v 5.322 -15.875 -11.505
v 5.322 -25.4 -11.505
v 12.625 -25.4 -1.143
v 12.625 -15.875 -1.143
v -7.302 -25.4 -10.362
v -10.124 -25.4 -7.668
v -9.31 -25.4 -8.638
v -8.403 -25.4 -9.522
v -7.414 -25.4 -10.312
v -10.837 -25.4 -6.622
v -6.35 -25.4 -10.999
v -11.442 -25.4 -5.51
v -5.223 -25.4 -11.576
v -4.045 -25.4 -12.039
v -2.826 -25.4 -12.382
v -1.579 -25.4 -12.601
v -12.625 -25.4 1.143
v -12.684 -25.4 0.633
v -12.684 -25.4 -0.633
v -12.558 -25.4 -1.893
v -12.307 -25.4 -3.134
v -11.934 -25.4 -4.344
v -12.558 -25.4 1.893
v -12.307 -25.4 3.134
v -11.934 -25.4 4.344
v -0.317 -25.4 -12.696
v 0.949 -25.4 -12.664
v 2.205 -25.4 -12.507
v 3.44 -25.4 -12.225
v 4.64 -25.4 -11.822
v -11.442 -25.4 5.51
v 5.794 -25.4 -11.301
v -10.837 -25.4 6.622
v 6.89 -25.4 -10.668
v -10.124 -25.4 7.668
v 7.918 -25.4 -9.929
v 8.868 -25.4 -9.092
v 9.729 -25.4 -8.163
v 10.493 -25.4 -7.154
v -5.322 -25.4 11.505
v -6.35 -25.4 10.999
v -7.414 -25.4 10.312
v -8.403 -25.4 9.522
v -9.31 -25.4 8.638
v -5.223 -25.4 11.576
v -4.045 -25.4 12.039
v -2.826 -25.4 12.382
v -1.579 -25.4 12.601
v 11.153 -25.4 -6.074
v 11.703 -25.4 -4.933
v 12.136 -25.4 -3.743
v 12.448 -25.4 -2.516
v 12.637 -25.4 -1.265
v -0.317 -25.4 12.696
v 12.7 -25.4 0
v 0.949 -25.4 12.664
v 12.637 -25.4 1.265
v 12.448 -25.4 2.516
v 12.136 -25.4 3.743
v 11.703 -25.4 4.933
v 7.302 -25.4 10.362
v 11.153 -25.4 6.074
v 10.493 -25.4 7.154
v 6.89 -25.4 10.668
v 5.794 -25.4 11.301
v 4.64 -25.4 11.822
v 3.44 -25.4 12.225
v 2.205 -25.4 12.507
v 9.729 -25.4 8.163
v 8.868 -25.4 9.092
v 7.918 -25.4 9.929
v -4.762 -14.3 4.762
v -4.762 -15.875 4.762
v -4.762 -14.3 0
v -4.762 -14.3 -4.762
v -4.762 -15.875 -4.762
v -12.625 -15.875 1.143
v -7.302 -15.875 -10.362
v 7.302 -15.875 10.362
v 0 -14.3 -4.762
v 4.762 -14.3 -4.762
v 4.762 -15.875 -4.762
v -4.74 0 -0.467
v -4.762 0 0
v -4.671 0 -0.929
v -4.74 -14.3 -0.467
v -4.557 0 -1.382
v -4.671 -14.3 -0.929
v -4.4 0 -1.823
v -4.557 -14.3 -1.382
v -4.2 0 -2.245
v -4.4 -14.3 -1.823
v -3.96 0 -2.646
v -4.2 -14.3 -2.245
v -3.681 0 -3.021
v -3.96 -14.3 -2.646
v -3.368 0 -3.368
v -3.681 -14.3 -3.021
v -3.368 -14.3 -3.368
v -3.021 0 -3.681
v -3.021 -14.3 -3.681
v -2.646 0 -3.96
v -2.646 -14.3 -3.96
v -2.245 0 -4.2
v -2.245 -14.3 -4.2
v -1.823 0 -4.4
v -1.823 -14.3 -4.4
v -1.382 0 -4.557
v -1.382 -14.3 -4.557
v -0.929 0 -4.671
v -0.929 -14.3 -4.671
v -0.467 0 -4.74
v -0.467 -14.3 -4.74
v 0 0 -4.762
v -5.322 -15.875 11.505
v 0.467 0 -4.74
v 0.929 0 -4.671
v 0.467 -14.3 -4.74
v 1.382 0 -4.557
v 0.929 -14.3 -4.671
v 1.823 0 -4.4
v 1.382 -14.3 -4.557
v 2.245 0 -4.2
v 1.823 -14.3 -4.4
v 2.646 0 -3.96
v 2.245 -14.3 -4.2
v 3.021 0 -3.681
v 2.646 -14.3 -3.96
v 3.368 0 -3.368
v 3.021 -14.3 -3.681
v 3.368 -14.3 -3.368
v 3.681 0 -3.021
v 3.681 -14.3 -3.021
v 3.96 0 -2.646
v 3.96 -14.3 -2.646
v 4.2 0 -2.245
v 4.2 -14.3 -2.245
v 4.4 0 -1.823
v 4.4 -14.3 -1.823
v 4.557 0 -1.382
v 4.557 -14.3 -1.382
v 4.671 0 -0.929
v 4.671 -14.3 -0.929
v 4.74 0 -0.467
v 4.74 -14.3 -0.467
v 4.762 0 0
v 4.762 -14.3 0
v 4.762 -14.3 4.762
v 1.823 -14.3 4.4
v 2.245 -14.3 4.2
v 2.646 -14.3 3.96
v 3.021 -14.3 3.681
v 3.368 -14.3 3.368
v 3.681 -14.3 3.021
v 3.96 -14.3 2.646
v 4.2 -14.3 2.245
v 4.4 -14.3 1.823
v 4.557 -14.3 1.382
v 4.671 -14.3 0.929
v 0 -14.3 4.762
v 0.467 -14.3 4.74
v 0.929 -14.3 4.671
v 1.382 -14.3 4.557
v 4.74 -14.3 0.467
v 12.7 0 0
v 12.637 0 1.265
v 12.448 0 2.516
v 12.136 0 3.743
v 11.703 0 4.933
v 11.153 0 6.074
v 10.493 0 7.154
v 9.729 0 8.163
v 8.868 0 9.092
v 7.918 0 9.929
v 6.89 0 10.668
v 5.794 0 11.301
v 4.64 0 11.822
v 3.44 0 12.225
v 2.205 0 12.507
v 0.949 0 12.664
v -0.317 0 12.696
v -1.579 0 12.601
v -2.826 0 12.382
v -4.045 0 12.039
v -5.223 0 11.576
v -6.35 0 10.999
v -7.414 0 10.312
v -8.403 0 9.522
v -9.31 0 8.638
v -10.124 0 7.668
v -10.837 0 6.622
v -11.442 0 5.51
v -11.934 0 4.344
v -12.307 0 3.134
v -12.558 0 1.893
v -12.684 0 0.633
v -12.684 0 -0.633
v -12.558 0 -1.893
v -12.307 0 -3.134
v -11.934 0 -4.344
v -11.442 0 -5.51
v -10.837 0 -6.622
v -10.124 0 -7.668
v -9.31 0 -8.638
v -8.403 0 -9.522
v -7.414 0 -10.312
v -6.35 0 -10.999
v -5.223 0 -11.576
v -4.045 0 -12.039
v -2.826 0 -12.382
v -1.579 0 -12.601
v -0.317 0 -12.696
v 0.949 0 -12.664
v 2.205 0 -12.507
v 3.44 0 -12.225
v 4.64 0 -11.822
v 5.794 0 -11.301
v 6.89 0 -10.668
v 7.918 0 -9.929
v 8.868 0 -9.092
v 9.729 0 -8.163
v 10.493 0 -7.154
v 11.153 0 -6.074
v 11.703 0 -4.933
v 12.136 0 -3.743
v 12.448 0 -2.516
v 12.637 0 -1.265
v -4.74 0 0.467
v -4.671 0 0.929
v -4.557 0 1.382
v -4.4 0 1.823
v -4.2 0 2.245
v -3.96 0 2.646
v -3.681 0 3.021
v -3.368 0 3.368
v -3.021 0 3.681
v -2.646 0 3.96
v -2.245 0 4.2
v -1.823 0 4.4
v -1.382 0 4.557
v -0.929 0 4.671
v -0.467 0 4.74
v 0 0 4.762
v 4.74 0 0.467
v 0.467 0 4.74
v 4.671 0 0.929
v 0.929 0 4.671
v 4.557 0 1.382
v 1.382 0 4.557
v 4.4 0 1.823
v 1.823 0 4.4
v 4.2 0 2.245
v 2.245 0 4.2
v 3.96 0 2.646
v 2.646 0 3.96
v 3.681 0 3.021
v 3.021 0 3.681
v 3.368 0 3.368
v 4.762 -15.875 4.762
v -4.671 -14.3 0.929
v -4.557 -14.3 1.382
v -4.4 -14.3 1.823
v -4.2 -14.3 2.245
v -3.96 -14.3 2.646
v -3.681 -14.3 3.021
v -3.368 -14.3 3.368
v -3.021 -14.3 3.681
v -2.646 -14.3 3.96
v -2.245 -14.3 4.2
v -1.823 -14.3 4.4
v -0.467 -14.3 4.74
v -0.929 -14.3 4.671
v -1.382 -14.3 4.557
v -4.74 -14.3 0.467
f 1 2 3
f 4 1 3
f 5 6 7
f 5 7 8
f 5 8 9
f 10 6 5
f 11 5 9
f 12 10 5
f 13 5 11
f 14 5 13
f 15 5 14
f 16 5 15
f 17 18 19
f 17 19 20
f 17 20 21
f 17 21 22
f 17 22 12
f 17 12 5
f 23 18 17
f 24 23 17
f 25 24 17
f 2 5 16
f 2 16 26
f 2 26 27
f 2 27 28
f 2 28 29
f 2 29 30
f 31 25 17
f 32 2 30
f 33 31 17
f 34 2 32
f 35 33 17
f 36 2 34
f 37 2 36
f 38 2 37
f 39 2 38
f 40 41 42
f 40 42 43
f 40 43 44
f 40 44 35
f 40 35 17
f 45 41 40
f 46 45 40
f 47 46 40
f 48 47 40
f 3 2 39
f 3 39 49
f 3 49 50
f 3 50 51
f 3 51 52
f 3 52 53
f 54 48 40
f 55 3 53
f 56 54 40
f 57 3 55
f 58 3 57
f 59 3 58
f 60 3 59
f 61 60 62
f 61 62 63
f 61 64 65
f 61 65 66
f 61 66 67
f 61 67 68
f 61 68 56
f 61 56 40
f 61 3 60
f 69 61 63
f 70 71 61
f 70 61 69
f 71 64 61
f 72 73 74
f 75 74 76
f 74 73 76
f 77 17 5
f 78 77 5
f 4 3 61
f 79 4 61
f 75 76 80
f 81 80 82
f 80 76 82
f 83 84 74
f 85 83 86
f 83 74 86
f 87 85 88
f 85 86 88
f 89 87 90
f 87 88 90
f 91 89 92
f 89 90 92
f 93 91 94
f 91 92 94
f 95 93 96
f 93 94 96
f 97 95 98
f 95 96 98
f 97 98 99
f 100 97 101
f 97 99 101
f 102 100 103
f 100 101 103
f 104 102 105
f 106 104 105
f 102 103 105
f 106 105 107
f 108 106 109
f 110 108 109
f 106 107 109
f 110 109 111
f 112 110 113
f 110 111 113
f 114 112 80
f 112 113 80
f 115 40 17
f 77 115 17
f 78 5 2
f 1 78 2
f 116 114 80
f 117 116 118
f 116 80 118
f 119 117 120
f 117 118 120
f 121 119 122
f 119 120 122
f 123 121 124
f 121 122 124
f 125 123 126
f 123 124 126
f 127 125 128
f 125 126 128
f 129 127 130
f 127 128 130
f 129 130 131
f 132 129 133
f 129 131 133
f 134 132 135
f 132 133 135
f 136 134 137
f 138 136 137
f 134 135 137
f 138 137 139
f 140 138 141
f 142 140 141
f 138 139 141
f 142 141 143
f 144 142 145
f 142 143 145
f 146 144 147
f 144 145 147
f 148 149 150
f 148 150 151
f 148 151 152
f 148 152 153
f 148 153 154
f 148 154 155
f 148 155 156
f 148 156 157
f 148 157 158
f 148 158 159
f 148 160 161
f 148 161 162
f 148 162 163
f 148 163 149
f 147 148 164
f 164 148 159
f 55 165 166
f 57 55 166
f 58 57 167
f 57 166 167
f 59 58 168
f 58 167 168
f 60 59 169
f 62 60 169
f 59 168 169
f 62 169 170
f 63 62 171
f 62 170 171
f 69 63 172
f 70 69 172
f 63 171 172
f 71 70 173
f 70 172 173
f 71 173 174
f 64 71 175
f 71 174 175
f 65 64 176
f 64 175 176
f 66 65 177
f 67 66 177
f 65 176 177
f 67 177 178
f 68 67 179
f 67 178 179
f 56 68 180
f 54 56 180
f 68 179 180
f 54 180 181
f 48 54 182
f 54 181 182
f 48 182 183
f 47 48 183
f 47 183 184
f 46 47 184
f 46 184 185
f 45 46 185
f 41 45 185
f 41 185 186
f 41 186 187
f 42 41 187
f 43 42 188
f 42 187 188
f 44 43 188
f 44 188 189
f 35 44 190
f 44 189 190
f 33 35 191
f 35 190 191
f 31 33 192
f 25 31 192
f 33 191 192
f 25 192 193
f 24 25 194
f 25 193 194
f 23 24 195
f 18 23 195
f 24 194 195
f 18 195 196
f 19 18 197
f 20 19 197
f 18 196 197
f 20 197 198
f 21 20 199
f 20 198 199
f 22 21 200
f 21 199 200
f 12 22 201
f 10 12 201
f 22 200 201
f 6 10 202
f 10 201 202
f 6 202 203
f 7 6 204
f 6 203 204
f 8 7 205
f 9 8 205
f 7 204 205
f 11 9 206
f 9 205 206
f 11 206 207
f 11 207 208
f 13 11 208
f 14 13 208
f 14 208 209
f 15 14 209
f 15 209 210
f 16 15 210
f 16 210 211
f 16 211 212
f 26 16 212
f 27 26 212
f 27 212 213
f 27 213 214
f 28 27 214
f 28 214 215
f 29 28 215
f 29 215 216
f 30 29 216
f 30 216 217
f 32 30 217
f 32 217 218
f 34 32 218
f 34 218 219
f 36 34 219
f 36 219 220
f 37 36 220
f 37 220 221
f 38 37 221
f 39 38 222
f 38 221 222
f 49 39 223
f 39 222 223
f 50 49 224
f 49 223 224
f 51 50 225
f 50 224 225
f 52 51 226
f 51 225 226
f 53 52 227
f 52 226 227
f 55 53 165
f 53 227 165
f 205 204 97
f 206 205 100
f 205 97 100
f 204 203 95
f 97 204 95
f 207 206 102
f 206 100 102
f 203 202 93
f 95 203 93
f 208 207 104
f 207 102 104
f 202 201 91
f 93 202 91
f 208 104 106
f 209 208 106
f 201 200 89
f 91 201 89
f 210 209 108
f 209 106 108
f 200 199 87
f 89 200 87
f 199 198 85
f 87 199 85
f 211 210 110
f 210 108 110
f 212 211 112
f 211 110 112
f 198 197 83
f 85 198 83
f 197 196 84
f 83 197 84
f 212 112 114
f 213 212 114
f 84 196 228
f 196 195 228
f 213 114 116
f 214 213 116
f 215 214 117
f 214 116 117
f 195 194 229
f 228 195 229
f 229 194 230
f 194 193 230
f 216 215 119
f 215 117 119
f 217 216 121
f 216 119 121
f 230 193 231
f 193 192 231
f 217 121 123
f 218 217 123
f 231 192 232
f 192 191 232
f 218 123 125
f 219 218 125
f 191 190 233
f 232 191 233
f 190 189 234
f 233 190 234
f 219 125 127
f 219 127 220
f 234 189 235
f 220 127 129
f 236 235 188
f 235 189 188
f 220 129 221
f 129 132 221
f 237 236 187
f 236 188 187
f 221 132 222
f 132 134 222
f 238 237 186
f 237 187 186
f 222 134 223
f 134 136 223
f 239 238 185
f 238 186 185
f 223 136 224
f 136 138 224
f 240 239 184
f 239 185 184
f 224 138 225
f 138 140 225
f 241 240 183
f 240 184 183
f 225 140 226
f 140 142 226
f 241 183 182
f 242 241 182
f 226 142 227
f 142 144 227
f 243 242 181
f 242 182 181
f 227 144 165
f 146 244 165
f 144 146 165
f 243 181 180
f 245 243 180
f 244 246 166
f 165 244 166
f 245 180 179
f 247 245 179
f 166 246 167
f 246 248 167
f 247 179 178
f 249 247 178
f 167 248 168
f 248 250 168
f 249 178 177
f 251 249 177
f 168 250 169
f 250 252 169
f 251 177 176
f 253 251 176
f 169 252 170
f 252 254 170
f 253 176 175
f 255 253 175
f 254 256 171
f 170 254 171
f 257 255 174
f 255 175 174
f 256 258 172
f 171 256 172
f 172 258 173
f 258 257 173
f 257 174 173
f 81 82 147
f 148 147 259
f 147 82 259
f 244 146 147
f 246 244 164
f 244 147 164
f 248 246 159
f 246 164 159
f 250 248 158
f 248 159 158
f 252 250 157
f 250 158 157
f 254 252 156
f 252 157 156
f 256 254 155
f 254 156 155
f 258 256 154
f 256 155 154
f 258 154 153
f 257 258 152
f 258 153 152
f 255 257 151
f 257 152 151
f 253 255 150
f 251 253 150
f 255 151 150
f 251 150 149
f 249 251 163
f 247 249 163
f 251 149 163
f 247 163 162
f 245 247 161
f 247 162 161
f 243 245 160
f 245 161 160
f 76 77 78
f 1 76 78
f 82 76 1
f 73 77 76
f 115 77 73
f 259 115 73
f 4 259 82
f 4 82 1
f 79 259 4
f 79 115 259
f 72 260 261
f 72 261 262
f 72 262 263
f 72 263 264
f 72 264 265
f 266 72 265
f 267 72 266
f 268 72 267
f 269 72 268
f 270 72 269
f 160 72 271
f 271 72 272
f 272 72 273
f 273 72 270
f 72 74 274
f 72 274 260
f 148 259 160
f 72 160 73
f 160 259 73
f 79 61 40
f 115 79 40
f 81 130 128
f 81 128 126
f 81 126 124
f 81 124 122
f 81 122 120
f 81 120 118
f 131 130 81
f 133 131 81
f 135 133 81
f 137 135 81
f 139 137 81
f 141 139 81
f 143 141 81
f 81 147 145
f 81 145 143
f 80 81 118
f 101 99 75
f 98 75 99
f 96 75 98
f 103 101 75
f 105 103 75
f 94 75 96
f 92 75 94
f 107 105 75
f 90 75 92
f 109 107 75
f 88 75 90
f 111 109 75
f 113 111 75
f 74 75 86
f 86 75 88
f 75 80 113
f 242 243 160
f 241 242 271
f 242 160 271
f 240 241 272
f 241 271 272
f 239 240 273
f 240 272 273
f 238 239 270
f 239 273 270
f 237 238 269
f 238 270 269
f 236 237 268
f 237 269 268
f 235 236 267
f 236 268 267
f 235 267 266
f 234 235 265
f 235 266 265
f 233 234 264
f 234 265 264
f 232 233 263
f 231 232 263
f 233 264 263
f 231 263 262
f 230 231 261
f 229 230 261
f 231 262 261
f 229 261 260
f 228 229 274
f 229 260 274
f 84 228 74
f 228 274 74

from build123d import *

# Parameters (mm, degrees)
F0_R     = 12.7
F1_DEPTH = 25.4
F3_DEPTH = 25.401
F4_DEPTH = 11.0998
F6_DEPTH = 9.525


with BuildPart() as f1:
    # F0 (on Front) → F1 (new body)
    with BuildSketch(Plane.XZ):
        Circle(F0_R)
    extrude(amount=F1_DEPTH)

    # F2 (on face) → F3 (cut, through all)
    with BuildSketch(Plane.XZ.offset(25.4)):
        with BuildLine():
            ThreePointArc((4.7625, 0), (3.367596, 3.367596), (0, 4.7625))
            ThreePointArc((0, 4.7625), (-3.367596, 3.367596), (-4.7625, 0))
            ThreePointArc((-4.7625, 0), (-3.367596, -3.367596), (0, -4.7625))
            ThreePointArc((0, -4.7625), (3.367596, -3.367596), (4.7625, 0))
        make_face()
    extrude(amount=-F3_DEPTH, mode=Mode.SUBTRACT)

    # F2 (on face) → F4 (cut)
    with BuildSketch(Plane.XZ.offset(25.4)):
        with BuildLine():
            Line((0, 4.7625), (-4.7625, 4.7625))
            Line((-4.7625, 4.7625), (-4.7625, 0))
            ThreePointArc((-4.7625, 0), (-3.367596, 3.367596), (0, 4.7625))
        make_face()
        with BuildLine():
            Line((4.7625, 4.7625), (0, 4.7625))
            ThreePointArc((0, 4.7625), (3.367596, 3.367596), (4.7625, 0))
            Line((4.7625, 0), (4.7625, 4.7625))
        make_face()
        with BuildLine():
            ThreePointArc((0, -4.7625), (-3.367596, -3.367596), (-4.7625, 0))
            Line((-4.7625, 0), (-4.7625, -4.7625))
            Line((-4.7625, -4.7625), (0, -4.7625))
        make_face()
        with BuildLine():
            Line((4.7625, -4.7625), (4.7625, 0))
            ThreePointArc((4.7625, 0), (3.367596, -3.367596), (0, -4.7625))
            Line((0, -4.7625), (4.7625, -4.7625))
        make_face()
    extrude(amount=-F4_DEPTH, mode=Mode.SUBTRACT)

    # F5 (on face) → F6 (cut)
    with BuildSketch(Plane.XZ.offset(25.4)):
        Polygon((-12.624906, 1.143208), (-7.3025, -10.361885), (5.322406, -11.505093), (12.624906, -1.143208), (7.3025, 10.361885), (-5.322406, 11.505093), align=None)
    extrude(amount=-F6_DEPTH, mode=Mode.SUBTRACT)


solid = f1.part
